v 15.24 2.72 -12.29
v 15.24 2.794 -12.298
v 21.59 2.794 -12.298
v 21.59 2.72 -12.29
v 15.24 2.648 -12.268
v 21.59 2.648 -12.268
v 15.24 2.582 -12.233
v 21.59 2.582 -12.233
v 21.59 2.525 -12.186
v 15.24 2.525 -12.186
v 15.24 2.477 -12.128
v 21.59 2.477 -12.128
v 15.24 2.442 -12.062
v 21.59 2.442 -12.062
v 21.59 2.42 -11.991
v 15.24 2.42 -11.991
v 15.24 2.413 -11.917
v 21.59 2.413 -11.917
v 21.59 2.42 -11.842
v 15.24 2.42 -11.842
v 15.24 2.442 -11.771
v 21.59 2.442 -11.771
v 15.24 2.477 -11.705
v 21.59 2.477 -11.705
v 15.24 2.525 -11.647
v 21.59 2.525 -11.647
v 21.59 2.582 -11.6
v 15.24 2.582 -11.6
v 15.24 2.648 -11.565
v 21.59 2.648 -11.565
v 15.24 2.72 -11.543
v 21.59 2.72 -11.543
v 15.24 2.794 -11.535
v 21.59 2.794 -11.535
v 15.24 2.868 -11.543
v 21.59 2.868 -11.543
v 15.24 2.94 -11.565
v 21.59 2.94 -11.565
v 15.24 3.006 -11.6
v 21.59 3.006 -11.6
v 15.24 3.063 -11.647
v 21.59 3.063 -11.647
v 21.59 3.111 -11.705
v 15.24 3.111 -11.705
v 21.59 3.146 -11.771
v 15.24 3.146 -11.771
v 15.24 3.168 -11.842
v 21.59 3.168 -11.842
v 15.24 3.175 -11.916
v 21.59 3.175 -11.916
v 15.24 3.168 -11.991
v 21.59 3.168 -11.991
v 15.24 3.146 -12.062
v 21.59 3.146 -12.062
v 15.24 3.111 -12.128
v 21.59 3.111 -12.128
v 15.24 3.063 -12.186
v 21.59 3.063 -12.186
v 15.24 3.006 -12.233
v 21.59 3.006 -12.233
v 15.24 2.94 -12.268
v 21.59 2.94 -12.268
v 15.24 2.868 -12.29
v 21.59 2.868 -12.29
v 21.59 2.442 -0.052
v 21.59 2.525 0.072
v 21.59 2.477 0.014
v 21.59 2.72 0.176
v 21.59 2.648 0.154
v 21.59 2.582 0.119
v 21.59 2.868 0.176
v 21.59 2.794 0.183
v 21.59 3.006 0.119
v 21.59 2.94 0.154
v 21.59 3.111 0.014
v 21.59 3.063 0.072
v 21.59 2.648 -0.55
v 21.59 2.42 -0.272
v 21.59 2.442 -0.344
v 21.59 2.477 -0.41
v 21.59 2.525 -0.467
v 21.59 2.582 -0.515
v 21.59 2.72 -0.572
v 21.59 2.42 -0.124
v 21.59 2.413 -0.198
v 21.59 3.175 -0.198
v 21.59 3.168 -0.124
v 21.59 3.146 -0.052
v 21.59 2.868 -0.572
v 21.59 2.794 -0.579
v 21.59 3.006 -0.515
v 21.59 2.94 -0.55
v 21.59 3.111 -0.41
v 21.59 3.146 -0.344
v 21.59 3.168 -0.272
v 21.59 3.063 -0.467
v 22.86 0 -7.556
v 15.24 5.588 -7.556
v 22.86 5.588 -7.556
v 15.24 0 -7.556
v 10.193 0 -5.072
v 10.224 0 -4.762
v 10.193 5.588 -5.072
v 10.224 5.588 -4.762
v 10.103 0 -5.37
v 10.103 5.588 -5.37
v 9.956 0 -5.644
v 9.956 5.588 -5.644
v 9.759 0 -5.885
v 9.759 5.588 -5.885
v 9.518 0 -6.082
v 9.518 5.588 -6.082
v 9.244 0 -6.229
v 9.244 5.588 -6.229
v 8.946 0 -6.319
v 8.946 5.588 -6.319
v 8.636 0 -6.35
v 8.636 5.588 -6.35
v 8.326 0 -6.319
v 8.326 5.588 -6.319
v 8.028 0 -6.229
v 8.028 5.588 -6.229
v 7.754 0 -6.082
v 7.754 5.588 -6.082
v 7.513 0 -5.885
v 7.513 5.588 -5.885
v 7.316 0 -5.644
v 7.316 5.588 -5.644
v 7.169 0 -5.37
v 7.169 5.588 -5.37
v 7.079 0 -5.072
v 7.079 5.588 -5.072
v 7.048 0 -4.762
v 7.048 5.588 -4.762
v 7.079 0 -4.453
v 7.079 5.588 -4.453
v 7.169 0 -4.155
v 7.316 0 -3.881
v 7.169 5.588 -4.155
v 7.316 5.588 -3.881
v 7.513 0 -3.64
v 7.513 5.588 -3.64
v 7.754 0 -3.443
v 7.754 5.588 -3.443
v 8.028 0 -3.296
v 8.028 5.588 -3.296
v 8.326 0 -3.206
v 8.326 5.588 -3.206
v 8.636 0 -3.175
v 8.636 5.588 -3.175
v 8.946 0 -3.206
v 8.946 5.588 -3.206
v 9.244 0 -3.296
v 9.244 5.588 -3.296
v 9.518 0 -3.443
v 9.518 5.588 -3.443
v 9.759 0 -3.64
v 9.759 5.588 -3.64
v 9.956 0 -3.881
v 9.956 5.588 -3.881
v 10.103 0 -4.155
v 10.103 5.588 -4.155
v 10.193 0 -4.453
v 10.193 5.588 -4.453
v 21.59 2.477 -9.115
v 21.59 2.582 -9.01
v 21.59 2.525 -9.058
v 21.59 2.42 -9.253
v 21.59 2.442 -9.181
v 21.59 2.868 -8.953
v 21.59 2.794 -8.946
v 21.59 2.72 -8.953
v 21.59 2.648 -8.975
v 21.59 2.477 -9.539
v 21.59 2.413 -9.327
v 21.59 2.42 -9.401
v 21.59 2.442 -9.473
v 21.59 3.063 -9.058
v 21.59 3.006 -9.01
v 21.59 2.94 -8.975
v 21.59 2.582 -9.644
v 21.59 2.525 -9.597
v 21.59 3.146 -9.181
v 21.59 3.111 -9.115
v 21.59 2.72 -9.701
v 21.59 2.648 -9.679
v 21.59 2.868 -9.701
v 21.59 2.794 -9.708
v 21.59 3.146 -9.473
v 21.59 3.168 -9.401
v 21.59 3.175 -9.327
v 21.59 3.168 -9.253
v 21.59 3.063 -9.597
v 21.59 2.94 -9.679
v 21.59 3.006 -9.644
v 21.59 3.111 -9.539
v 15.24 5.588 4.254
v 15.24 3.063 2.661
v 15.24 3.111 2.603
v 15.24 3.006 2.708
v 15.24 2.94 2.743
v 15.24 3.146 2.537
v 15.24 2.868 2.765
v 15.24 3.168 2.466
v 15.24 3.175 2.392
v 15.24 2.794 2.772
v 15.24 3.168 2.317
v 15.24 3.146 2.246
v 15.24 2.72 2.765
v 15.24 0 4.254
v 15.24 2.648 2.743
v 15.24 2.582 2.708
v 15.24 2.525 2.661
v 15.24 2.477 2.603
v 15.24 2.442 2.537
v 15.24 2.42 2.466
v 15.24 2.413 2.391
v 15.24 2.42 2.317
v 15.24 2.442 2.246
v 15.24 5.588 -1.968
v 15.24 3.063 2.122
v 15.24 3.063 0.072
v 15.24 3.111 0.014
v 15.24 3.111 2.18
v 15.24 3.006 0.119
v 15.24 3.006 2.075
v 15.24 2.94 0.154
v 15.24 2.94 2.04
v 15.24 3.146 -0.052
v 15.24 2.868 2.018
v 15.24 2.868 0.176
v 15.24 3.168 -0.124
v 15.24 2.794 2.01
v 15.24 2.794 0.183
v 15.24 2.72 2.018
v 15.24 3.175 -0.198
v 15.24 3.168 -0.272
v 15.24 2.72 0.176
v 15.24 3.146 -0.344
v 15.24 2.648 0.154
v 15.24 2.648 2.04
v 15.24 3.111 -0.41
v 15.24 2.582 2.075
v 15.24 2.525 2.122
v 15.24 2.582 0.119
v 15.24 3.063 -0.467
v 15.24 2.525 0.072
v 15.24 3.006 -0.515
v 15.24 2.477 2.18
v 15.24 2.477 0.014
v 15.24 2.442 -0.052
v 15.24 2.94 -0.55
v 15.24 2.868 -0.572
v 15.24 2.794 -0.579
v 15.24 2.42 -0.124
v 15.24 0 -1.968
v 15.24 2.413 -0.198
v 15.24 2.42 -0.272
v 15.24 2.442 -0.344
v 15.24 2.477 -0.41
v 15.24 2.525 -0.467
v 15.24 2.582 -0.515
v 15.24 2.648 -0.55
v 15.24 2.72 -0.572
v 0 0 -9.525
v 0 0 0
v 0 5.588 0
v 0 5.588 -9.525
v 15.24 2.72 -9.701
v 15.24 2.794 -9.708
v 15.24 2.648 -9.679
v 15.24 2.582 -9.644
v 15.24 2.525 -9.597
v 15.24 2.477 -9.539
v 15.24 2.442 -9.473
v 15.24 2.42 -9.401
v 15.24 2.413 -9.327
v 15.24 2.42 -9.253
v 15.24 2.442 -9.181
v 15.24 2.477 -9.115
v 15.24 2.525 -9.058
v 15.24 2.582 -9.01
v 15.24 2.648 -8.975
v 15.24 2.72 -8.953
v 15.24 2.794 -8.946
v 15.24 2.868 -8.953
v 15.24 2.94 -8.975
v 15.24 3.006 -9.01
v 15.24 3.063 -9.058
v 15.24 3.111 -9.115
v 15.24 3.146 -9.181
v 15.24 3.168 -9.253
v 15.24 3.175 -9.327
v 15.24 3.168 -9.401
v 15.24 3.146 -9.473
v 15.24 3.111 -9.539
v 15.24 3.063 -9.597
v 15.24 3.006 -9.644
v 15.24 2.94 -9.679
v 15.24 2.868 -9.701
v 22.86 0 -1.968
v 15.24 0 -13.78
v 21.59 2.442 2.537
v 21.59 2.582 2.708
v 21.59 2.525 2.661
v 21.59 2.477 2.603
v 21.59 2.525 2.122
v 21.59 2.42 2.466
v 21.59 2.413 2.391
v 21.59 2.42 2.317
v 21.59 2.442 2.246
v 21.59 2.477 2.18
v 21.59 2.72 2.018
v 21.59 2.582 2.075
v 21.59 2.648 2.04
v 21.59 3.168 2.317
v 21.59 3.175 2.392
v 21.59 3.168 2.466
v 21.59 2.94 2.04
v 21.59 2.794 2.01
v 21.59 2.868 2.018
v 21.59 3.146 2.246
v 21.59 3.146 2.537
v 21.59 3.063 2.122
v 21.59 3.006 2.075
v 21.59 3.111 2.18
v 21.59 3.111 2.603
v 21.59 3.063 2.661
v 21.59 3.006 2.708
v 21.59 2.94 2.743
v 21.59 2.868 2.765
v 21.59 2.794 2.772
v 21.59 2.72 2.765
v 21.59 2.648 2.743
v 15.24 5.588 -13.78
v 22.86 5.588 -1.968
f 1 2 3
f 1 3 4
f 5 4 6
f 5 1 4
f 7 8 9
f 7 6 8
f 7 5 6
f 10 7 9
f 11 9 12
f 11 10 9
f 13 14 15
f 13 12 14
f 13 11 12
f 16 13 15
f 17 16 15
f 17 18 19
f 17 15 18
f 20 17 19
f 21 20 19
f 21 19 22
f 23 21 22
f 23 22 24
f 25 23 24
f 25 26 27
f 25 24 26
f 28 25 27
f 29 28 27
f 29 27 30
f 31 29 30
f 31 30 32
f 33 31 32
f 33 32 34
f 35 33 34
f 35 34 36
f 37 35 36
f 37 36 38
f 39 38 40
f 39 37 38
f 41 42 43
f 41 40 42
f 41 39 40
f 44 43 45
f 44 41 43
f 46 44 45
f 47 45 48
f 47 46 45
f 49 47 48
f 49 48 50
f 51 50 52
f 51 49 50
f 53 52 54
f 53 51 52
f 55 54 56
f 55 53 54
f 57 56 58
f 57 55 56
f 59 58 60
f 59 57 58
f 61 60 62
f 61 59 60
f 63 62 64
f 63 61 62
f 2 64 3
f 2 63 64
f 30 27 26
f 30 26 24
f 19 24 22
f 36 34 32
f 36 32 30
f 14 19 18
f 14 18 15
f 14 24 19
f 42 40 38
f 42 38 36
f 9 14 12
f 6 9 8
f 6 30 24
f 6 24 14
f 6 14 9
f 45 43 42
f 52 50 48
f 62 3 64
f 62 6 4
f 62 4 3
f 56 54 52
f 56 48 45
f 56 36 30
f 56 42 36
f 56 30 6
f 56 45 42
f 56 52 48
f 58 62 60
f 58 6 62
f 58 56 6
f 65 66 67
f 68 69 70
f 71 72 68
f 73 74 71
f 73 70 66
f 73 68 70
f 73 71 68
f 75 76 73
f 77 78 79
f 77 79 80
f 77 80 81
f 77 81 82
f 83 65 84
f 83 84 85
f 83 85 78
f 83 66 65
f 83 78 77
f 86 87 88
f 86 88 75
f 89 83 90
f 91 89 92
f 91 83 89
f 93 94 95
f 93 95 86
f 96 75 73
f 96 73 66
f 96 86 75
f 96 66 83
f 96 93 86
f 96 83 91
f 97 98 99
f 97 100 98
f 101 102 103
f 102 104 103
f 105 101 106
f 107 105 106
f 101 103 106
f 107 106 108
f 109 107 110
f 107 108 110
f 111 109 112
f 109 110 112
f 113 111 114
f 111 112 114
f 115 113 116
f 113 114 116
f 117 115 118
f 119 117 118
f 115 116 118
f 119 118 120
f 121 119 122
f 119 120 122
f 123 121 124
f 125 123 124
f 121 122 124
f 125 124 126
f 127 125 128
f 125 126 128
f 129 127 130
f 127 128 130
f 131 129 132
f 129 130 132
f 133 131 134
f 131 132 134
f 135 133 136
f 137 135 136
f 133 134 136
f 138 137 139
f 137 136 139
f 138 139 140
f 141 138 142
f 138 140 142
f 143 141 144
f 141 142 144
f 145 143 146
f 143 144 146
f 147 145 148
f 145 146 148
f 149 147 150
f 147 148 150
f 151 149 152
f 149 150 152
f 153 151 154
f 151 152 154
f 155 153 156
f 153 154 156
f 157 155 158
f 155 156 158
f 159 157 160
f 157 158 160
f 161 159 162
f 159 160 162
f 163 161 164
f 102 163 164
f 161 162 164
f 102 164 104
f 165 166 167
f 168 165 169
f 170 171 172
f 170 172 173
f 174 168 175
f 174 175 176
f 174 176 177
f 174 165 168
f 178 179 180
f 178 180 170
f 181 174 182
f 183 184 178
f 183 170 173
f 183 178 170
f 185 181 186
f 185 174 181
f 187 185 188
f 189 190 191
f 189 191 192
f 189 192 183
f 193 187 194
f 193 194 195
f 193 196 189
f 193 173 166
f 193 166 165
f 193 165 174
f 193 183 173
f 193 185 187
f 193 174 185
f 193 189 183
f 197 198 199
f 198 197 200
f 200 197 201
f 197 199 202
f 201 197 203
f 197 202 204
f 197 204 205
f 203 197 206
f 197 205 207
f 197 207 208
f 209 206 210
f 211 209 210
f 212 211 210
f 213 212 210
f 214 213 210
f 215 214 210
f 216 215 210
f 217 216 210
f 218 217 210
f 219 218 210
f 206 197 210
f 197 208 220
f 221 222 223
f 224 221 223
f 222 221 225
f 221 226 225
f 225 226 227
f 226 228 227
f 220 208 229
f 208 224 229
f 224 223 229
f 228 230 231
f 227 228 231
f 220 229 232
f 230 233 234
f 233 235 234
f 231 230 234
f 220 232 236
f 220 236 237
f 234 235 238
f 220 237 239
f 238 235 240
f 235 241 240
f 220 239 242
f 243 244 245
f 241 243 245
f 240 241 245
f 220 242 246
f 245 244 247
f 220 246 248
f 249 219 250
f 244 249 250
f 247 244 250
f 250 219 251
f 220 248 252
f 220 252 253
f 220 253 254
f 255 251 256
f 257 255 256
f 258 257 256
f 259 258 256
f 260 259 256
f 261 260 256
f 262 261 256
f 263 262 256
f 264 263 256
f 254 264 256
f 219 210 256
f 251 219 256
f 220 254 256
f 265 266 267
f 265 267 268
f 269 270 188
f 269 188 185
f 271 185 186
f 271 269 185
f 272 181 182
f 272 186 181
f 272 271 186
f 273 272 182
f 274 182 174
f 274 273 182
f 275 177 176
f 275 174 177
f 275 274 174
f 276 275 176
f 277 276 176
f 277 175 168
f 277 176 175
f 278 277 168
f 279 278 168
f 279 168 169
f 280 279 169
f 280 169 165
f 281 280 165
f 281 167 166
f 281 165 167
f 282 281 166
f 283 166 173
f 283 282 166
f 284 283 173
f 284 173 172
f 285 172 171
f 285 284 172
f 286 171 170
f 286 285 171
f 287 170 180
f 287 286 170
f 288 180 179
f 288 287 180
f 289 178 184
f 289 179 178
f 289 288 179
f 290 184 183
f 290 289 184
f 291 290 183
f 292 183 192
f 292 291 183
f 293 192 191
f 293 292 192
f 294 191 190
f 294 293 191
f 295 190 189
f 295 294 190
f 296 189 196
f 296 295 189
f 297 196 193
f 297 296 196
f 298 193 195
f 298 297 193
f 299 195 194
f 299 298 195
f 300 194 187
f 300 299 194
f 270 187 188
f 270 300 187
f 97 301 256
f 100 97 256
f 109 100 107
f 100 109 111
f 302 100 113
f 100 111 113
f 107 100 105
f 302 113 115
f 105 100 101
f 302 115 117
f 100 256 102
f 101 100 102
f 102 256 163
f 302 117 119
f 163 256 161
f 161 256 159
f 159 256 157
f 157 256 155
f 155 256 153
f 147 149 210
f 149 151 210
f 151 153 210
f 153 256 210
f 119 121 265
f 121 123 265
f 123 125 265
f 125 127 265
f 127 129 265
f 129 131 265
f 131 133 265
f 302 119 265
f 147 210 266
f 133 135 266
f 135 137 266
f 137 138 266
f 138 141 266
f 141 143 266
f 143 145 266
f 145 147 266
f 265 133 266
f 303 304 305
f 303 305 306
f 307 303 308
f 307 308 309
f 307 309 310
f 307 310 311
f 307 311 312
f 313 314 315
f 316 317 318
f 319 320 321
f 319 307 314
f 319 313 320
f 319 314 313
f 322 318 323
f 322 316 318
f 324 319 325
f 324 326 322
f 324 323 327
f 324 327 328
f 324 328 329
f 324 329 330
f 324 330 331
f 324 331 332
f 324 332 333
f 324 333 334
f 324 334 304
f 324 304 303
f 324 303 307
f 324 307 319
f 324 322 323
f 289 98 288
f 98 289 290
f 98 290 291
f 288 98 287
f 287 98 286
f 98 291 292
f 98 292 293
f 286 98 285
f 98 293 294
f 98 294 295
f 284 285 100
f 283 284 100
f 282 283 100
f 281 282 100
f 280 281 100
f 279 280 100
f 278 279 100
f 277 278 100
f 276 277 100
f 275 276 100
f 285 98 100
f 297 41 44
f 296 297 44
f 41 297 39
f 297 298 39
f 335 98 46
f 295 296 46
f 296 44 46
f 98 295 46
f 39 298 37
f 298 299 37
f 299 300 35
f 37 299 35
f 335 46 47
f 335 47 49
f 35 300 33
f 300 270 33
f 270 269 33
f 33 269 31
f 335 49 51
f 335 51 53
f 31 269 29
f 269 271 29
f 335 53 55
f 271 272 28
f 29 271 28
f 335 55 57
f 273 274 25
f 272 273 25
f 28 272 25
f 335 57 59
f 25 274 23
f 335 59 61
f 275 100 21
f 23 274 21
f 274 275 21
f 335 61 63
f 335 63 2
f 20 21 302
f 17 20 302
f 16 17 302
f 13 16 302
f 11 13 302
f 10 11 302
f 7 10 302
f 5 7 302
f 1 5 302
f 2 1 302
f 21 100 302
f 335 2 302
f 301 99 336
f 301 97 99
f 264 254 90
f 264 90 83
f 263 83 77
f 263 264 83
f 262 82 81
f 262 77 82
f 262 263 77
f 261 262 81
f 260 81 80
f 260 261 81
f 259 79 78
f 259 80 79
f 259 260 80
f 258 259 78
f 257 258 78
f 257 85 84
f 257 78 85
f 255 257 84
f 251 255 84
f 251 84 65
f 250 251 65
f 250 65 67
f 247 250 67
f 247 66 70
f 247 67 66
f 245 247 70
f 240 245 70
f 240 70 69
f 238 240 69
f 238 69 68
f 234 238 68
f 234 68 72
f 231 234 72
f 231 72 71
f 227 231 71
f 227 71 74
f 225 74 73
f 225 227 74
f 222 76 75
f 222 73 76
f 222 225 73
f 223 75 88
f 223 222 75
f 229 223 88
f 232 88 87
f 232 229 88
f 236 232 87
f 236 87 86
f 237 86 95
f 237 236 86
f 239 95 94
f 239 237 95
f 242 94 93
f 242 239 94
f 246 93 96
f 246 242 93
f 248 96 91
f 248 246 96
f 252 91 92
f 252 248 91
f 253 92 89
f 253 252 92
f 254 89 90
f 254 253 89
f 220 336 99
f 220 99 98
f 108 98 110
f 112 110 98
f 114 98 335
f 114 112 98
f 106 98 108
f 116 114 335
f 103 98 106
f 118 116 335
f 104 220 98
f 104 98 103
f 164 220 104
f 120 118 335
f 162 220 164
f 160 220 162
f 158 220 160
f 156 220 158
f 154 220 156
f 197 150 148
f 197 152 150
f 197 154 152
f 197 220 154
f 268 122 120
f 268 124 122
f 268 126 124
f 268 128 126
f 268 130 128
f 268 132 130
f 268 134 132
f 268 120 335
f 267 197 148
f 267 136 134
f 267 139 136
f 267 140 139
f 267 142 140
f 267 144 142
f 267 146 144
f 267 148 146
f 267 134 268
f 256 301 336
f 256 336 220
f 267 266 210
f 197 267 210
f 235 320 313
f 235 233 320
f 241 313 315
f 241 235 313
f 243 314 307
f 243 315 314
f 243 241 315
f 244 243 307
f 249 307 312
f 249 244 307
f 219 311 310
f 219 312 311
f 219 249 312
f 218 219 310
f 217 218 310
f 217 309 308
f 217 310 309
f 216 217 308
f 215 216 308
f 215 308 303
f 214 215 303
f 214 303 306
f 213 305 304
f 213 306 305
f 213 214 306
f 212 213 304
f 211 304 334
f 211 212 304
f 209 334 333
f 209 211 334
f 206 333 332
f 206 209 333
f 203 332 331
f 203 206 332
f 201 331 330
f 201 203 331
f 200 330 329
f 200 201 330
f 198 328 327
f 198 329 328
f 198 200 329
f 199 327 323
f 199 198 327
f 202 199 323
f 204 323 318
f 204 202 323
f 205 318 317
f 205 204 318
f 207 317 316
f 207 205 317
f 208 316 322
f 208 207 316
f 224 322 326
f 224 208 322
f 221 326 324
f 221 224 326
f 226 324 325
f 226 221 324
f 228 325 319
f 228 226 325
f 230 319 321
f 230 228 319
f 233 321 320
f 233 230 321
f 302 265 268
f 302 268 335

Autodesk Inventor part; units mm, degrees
ref_plane "YZ Plane" through (0, 0, 0) normal (1, 0, 0) x (0, 1, 0)
ref_plane "XZ Plane" through (0, 0, 0) normal (0, 1, 0) x (-1, 0, 0)
sketch "Sketch1" plane through (0, 0, 0) normal (0, 1, 0) x (-1, 0, 0)
  line L0 (0, 0) -> (0, -9.525)
  line L1 (-15.24, 4.2545) -> (-15.24, -13.7795)
  line L2 (0, 0) -> (-15.24, 4.2545)
  line L3 (0, -9.525) -> (-15.24, -13.7795)
  line L4 (-15.24, 4.2545) -> (-19.05, 4.2545)
  line L5 (-19.05, 4.2545) -> (-19.05, 2.9845)
  line L6 (-19.05, 2.9845) -> (-15.24, 2.9845)
  line L7 (-15.24, 2.9845) -> (-15.24, 4.2545)
  line L8 (-15.24, -13.7795) -> (-19.05, -13.7795)
  line L9 (-19.05, -13.7795) -> (-19.05, -12.5095)
  line L10 (-19.05, -12.5095) -> (-15.24, -12.5095)
  line L11 (-15.24, -12.5095) -> (-15.24, -13.7795)
  line L12 (0, 0) -> (0, 3.175)
  line L13 (-15.24, 4.2545) -> (-15.24, 7.4295)
  line L14 (0, -9.525) -> (0, -12.7)
  line L15 (-15.24, -13.7795) -> (-15.24, -16.9545)
  line L16 (-15.24, -16.9545) -> (0, -12.7)
  line L17 (0, 3.175) -> (-15.24, 7.4295)
  line L18 (-15.24, 7.4295) -> (-34.29, 7.4295)
  line L19 (-19.05, 4.2545) -> (-34.29, 4.2545)
  line L20 (-34.29, 4.2545) -> (-34.29, 7.4295)
  line L21 (-15.24, -16.9545) -> (-34.29, -16.9545)
  line L22 (-34.29, -16.9545) -> (-34.29, -13.7795)
  line L23 (-34.29, -13.7795) -> (-19.05, -13.7795)
  line L24 (-34.29, 7.4295) -> (-37.465, 7.4295)
  line L25 (-37.465, 7.4295) -> (-37.465, -17.5895)
  line L26 (-37.465, -17.5895) -> (-34.29, -17.5895)
  line L27 (-34.29, -17.5895) -> (-34.29, 7.4295)
  line L28 (-15.24, -13.7795) -> (-34.29, -13.7795)
  line L29 (-34.29, -13.7795) -> (-34.29, 4.2545)
  line L30 (-34.29, 4.2545) -> (-15.24, 4.2545)
  line L31 (-15.24, 4.2545) -> (-15.24, -13.7795)
  line L32 (-15.24, 4.2545) -> (-34.29, 4.2545)
  line L33 (-34.29, 4.2545) -> (-34.29, 7.4295)
  line L34 (-34.29, 7.4295) -> (-15.24, 7.4295)
  line L35 (-15.24, 7.4295) -> (-15.24, 4.2545)
  line L36 (-15.24, -7.5565) -> (-22.86, -7.5565)
  line L37 (-22.86, -7.5565) -> (-22.86, -1.9685)
  line L38 (-22.86, -1.9685) -> (-15.24, -1.9685)
  line L39 (-15.24, -1.9685) -> (-15.24, -7.5565)
  dimension "d0" = 9.525
  dimension "d1" = 15.24
  dimension "d2" = 18.034
  dimension "d3" = 4.2545
  dimension "d4" = 3.81
  dimension "d5" = 1.27
  dimension "d6" = 3.81
  dimension "d7" = 1.27
  dimension "d8" = 3.175
  dimension "d9" = 3.175
  dimension "d10" = 3.175
  dimension "d11" = 3.175
  dimension "d12" = 19.05
  dimension "d13" = 3.175
  dimension "d30" = 7.62
  dimension "d31" = 5.588
  dimension "d32" = 6.223
extrude "Extrusion6" add sketch "Sketch1" along normal blind 5.588 contours L0 L3 L1 L2 | L1 L36 L37 L38
sketch "Sketch5" plane through (0, 5.588, 0) normal (0, 1, 0) x (1, 0, 0)
  circle A0 centre (8.636, 4.7625) radius 1.5875
  line L0 (0, 9.525) -> (0, 0) projected
  dimension "d35" = 3.175
  dimension "d36" = 8.636
extrude "Extrusion7" cut sketch "Sketch5" against normal blind 5.588
sketch "Sketch6" plane through (15.24, 0, 4.2545) normal (1, 0, 0) x (0, 0, -1)
  line L0 (6.223, 0) -> (6.223, 5.588) projected
  line L1 (0, 5.588) -> (6.223, 5.588) projected
  line L2 (0, 0) -> (0, 5.588) projected
  line L3 (0, 0) -> (6.223, 0) projected
  line L4 (11.811, 5.588) -> (11.811, 0) projected
  line L5 (11.811, 0) -> (18.034, 0) projected
  line L6 (18.034, 0) -> (18.034, 5.588) projected
  line L7 (11.811, 5.588) -> (18.034, 5.588) projected
  circle A0 centre (1.863, 2.794) radius 0.381
  circle A1 centre (4.4524, 2.794) radius 0.381
  line L8 (6.223, 5.588) -> (11.811, 5.588) projected
  line L9 (9.017, 5.588) -> (9.017, 8.4963)
  circle A2 centre (16.171, 2.794) radius 0.381
  circle A3 centre (13.5816, 2.794) radius 0.381
  point P0 (4.2545, 0)
  dimension "d39" = 0.762
  dimension "d40" = 0.762
extrude "Extrusion8" add sketch "Sketch6" along normal blind 6.35 contours A0 | A1 | A2 | A3
ref_plane "Work Plane1" through (15.24, 0, -4.7625) normal (0, 0, -1) x (-1, 0, 0)
equation "\"d3\" = -0.5 * d0 + 0.5 * d2"
equation "\"d32\" = -0.5 * d31 + 0.5 * d2"
properties part number "photoTransistor" material "ABS Plastic"
